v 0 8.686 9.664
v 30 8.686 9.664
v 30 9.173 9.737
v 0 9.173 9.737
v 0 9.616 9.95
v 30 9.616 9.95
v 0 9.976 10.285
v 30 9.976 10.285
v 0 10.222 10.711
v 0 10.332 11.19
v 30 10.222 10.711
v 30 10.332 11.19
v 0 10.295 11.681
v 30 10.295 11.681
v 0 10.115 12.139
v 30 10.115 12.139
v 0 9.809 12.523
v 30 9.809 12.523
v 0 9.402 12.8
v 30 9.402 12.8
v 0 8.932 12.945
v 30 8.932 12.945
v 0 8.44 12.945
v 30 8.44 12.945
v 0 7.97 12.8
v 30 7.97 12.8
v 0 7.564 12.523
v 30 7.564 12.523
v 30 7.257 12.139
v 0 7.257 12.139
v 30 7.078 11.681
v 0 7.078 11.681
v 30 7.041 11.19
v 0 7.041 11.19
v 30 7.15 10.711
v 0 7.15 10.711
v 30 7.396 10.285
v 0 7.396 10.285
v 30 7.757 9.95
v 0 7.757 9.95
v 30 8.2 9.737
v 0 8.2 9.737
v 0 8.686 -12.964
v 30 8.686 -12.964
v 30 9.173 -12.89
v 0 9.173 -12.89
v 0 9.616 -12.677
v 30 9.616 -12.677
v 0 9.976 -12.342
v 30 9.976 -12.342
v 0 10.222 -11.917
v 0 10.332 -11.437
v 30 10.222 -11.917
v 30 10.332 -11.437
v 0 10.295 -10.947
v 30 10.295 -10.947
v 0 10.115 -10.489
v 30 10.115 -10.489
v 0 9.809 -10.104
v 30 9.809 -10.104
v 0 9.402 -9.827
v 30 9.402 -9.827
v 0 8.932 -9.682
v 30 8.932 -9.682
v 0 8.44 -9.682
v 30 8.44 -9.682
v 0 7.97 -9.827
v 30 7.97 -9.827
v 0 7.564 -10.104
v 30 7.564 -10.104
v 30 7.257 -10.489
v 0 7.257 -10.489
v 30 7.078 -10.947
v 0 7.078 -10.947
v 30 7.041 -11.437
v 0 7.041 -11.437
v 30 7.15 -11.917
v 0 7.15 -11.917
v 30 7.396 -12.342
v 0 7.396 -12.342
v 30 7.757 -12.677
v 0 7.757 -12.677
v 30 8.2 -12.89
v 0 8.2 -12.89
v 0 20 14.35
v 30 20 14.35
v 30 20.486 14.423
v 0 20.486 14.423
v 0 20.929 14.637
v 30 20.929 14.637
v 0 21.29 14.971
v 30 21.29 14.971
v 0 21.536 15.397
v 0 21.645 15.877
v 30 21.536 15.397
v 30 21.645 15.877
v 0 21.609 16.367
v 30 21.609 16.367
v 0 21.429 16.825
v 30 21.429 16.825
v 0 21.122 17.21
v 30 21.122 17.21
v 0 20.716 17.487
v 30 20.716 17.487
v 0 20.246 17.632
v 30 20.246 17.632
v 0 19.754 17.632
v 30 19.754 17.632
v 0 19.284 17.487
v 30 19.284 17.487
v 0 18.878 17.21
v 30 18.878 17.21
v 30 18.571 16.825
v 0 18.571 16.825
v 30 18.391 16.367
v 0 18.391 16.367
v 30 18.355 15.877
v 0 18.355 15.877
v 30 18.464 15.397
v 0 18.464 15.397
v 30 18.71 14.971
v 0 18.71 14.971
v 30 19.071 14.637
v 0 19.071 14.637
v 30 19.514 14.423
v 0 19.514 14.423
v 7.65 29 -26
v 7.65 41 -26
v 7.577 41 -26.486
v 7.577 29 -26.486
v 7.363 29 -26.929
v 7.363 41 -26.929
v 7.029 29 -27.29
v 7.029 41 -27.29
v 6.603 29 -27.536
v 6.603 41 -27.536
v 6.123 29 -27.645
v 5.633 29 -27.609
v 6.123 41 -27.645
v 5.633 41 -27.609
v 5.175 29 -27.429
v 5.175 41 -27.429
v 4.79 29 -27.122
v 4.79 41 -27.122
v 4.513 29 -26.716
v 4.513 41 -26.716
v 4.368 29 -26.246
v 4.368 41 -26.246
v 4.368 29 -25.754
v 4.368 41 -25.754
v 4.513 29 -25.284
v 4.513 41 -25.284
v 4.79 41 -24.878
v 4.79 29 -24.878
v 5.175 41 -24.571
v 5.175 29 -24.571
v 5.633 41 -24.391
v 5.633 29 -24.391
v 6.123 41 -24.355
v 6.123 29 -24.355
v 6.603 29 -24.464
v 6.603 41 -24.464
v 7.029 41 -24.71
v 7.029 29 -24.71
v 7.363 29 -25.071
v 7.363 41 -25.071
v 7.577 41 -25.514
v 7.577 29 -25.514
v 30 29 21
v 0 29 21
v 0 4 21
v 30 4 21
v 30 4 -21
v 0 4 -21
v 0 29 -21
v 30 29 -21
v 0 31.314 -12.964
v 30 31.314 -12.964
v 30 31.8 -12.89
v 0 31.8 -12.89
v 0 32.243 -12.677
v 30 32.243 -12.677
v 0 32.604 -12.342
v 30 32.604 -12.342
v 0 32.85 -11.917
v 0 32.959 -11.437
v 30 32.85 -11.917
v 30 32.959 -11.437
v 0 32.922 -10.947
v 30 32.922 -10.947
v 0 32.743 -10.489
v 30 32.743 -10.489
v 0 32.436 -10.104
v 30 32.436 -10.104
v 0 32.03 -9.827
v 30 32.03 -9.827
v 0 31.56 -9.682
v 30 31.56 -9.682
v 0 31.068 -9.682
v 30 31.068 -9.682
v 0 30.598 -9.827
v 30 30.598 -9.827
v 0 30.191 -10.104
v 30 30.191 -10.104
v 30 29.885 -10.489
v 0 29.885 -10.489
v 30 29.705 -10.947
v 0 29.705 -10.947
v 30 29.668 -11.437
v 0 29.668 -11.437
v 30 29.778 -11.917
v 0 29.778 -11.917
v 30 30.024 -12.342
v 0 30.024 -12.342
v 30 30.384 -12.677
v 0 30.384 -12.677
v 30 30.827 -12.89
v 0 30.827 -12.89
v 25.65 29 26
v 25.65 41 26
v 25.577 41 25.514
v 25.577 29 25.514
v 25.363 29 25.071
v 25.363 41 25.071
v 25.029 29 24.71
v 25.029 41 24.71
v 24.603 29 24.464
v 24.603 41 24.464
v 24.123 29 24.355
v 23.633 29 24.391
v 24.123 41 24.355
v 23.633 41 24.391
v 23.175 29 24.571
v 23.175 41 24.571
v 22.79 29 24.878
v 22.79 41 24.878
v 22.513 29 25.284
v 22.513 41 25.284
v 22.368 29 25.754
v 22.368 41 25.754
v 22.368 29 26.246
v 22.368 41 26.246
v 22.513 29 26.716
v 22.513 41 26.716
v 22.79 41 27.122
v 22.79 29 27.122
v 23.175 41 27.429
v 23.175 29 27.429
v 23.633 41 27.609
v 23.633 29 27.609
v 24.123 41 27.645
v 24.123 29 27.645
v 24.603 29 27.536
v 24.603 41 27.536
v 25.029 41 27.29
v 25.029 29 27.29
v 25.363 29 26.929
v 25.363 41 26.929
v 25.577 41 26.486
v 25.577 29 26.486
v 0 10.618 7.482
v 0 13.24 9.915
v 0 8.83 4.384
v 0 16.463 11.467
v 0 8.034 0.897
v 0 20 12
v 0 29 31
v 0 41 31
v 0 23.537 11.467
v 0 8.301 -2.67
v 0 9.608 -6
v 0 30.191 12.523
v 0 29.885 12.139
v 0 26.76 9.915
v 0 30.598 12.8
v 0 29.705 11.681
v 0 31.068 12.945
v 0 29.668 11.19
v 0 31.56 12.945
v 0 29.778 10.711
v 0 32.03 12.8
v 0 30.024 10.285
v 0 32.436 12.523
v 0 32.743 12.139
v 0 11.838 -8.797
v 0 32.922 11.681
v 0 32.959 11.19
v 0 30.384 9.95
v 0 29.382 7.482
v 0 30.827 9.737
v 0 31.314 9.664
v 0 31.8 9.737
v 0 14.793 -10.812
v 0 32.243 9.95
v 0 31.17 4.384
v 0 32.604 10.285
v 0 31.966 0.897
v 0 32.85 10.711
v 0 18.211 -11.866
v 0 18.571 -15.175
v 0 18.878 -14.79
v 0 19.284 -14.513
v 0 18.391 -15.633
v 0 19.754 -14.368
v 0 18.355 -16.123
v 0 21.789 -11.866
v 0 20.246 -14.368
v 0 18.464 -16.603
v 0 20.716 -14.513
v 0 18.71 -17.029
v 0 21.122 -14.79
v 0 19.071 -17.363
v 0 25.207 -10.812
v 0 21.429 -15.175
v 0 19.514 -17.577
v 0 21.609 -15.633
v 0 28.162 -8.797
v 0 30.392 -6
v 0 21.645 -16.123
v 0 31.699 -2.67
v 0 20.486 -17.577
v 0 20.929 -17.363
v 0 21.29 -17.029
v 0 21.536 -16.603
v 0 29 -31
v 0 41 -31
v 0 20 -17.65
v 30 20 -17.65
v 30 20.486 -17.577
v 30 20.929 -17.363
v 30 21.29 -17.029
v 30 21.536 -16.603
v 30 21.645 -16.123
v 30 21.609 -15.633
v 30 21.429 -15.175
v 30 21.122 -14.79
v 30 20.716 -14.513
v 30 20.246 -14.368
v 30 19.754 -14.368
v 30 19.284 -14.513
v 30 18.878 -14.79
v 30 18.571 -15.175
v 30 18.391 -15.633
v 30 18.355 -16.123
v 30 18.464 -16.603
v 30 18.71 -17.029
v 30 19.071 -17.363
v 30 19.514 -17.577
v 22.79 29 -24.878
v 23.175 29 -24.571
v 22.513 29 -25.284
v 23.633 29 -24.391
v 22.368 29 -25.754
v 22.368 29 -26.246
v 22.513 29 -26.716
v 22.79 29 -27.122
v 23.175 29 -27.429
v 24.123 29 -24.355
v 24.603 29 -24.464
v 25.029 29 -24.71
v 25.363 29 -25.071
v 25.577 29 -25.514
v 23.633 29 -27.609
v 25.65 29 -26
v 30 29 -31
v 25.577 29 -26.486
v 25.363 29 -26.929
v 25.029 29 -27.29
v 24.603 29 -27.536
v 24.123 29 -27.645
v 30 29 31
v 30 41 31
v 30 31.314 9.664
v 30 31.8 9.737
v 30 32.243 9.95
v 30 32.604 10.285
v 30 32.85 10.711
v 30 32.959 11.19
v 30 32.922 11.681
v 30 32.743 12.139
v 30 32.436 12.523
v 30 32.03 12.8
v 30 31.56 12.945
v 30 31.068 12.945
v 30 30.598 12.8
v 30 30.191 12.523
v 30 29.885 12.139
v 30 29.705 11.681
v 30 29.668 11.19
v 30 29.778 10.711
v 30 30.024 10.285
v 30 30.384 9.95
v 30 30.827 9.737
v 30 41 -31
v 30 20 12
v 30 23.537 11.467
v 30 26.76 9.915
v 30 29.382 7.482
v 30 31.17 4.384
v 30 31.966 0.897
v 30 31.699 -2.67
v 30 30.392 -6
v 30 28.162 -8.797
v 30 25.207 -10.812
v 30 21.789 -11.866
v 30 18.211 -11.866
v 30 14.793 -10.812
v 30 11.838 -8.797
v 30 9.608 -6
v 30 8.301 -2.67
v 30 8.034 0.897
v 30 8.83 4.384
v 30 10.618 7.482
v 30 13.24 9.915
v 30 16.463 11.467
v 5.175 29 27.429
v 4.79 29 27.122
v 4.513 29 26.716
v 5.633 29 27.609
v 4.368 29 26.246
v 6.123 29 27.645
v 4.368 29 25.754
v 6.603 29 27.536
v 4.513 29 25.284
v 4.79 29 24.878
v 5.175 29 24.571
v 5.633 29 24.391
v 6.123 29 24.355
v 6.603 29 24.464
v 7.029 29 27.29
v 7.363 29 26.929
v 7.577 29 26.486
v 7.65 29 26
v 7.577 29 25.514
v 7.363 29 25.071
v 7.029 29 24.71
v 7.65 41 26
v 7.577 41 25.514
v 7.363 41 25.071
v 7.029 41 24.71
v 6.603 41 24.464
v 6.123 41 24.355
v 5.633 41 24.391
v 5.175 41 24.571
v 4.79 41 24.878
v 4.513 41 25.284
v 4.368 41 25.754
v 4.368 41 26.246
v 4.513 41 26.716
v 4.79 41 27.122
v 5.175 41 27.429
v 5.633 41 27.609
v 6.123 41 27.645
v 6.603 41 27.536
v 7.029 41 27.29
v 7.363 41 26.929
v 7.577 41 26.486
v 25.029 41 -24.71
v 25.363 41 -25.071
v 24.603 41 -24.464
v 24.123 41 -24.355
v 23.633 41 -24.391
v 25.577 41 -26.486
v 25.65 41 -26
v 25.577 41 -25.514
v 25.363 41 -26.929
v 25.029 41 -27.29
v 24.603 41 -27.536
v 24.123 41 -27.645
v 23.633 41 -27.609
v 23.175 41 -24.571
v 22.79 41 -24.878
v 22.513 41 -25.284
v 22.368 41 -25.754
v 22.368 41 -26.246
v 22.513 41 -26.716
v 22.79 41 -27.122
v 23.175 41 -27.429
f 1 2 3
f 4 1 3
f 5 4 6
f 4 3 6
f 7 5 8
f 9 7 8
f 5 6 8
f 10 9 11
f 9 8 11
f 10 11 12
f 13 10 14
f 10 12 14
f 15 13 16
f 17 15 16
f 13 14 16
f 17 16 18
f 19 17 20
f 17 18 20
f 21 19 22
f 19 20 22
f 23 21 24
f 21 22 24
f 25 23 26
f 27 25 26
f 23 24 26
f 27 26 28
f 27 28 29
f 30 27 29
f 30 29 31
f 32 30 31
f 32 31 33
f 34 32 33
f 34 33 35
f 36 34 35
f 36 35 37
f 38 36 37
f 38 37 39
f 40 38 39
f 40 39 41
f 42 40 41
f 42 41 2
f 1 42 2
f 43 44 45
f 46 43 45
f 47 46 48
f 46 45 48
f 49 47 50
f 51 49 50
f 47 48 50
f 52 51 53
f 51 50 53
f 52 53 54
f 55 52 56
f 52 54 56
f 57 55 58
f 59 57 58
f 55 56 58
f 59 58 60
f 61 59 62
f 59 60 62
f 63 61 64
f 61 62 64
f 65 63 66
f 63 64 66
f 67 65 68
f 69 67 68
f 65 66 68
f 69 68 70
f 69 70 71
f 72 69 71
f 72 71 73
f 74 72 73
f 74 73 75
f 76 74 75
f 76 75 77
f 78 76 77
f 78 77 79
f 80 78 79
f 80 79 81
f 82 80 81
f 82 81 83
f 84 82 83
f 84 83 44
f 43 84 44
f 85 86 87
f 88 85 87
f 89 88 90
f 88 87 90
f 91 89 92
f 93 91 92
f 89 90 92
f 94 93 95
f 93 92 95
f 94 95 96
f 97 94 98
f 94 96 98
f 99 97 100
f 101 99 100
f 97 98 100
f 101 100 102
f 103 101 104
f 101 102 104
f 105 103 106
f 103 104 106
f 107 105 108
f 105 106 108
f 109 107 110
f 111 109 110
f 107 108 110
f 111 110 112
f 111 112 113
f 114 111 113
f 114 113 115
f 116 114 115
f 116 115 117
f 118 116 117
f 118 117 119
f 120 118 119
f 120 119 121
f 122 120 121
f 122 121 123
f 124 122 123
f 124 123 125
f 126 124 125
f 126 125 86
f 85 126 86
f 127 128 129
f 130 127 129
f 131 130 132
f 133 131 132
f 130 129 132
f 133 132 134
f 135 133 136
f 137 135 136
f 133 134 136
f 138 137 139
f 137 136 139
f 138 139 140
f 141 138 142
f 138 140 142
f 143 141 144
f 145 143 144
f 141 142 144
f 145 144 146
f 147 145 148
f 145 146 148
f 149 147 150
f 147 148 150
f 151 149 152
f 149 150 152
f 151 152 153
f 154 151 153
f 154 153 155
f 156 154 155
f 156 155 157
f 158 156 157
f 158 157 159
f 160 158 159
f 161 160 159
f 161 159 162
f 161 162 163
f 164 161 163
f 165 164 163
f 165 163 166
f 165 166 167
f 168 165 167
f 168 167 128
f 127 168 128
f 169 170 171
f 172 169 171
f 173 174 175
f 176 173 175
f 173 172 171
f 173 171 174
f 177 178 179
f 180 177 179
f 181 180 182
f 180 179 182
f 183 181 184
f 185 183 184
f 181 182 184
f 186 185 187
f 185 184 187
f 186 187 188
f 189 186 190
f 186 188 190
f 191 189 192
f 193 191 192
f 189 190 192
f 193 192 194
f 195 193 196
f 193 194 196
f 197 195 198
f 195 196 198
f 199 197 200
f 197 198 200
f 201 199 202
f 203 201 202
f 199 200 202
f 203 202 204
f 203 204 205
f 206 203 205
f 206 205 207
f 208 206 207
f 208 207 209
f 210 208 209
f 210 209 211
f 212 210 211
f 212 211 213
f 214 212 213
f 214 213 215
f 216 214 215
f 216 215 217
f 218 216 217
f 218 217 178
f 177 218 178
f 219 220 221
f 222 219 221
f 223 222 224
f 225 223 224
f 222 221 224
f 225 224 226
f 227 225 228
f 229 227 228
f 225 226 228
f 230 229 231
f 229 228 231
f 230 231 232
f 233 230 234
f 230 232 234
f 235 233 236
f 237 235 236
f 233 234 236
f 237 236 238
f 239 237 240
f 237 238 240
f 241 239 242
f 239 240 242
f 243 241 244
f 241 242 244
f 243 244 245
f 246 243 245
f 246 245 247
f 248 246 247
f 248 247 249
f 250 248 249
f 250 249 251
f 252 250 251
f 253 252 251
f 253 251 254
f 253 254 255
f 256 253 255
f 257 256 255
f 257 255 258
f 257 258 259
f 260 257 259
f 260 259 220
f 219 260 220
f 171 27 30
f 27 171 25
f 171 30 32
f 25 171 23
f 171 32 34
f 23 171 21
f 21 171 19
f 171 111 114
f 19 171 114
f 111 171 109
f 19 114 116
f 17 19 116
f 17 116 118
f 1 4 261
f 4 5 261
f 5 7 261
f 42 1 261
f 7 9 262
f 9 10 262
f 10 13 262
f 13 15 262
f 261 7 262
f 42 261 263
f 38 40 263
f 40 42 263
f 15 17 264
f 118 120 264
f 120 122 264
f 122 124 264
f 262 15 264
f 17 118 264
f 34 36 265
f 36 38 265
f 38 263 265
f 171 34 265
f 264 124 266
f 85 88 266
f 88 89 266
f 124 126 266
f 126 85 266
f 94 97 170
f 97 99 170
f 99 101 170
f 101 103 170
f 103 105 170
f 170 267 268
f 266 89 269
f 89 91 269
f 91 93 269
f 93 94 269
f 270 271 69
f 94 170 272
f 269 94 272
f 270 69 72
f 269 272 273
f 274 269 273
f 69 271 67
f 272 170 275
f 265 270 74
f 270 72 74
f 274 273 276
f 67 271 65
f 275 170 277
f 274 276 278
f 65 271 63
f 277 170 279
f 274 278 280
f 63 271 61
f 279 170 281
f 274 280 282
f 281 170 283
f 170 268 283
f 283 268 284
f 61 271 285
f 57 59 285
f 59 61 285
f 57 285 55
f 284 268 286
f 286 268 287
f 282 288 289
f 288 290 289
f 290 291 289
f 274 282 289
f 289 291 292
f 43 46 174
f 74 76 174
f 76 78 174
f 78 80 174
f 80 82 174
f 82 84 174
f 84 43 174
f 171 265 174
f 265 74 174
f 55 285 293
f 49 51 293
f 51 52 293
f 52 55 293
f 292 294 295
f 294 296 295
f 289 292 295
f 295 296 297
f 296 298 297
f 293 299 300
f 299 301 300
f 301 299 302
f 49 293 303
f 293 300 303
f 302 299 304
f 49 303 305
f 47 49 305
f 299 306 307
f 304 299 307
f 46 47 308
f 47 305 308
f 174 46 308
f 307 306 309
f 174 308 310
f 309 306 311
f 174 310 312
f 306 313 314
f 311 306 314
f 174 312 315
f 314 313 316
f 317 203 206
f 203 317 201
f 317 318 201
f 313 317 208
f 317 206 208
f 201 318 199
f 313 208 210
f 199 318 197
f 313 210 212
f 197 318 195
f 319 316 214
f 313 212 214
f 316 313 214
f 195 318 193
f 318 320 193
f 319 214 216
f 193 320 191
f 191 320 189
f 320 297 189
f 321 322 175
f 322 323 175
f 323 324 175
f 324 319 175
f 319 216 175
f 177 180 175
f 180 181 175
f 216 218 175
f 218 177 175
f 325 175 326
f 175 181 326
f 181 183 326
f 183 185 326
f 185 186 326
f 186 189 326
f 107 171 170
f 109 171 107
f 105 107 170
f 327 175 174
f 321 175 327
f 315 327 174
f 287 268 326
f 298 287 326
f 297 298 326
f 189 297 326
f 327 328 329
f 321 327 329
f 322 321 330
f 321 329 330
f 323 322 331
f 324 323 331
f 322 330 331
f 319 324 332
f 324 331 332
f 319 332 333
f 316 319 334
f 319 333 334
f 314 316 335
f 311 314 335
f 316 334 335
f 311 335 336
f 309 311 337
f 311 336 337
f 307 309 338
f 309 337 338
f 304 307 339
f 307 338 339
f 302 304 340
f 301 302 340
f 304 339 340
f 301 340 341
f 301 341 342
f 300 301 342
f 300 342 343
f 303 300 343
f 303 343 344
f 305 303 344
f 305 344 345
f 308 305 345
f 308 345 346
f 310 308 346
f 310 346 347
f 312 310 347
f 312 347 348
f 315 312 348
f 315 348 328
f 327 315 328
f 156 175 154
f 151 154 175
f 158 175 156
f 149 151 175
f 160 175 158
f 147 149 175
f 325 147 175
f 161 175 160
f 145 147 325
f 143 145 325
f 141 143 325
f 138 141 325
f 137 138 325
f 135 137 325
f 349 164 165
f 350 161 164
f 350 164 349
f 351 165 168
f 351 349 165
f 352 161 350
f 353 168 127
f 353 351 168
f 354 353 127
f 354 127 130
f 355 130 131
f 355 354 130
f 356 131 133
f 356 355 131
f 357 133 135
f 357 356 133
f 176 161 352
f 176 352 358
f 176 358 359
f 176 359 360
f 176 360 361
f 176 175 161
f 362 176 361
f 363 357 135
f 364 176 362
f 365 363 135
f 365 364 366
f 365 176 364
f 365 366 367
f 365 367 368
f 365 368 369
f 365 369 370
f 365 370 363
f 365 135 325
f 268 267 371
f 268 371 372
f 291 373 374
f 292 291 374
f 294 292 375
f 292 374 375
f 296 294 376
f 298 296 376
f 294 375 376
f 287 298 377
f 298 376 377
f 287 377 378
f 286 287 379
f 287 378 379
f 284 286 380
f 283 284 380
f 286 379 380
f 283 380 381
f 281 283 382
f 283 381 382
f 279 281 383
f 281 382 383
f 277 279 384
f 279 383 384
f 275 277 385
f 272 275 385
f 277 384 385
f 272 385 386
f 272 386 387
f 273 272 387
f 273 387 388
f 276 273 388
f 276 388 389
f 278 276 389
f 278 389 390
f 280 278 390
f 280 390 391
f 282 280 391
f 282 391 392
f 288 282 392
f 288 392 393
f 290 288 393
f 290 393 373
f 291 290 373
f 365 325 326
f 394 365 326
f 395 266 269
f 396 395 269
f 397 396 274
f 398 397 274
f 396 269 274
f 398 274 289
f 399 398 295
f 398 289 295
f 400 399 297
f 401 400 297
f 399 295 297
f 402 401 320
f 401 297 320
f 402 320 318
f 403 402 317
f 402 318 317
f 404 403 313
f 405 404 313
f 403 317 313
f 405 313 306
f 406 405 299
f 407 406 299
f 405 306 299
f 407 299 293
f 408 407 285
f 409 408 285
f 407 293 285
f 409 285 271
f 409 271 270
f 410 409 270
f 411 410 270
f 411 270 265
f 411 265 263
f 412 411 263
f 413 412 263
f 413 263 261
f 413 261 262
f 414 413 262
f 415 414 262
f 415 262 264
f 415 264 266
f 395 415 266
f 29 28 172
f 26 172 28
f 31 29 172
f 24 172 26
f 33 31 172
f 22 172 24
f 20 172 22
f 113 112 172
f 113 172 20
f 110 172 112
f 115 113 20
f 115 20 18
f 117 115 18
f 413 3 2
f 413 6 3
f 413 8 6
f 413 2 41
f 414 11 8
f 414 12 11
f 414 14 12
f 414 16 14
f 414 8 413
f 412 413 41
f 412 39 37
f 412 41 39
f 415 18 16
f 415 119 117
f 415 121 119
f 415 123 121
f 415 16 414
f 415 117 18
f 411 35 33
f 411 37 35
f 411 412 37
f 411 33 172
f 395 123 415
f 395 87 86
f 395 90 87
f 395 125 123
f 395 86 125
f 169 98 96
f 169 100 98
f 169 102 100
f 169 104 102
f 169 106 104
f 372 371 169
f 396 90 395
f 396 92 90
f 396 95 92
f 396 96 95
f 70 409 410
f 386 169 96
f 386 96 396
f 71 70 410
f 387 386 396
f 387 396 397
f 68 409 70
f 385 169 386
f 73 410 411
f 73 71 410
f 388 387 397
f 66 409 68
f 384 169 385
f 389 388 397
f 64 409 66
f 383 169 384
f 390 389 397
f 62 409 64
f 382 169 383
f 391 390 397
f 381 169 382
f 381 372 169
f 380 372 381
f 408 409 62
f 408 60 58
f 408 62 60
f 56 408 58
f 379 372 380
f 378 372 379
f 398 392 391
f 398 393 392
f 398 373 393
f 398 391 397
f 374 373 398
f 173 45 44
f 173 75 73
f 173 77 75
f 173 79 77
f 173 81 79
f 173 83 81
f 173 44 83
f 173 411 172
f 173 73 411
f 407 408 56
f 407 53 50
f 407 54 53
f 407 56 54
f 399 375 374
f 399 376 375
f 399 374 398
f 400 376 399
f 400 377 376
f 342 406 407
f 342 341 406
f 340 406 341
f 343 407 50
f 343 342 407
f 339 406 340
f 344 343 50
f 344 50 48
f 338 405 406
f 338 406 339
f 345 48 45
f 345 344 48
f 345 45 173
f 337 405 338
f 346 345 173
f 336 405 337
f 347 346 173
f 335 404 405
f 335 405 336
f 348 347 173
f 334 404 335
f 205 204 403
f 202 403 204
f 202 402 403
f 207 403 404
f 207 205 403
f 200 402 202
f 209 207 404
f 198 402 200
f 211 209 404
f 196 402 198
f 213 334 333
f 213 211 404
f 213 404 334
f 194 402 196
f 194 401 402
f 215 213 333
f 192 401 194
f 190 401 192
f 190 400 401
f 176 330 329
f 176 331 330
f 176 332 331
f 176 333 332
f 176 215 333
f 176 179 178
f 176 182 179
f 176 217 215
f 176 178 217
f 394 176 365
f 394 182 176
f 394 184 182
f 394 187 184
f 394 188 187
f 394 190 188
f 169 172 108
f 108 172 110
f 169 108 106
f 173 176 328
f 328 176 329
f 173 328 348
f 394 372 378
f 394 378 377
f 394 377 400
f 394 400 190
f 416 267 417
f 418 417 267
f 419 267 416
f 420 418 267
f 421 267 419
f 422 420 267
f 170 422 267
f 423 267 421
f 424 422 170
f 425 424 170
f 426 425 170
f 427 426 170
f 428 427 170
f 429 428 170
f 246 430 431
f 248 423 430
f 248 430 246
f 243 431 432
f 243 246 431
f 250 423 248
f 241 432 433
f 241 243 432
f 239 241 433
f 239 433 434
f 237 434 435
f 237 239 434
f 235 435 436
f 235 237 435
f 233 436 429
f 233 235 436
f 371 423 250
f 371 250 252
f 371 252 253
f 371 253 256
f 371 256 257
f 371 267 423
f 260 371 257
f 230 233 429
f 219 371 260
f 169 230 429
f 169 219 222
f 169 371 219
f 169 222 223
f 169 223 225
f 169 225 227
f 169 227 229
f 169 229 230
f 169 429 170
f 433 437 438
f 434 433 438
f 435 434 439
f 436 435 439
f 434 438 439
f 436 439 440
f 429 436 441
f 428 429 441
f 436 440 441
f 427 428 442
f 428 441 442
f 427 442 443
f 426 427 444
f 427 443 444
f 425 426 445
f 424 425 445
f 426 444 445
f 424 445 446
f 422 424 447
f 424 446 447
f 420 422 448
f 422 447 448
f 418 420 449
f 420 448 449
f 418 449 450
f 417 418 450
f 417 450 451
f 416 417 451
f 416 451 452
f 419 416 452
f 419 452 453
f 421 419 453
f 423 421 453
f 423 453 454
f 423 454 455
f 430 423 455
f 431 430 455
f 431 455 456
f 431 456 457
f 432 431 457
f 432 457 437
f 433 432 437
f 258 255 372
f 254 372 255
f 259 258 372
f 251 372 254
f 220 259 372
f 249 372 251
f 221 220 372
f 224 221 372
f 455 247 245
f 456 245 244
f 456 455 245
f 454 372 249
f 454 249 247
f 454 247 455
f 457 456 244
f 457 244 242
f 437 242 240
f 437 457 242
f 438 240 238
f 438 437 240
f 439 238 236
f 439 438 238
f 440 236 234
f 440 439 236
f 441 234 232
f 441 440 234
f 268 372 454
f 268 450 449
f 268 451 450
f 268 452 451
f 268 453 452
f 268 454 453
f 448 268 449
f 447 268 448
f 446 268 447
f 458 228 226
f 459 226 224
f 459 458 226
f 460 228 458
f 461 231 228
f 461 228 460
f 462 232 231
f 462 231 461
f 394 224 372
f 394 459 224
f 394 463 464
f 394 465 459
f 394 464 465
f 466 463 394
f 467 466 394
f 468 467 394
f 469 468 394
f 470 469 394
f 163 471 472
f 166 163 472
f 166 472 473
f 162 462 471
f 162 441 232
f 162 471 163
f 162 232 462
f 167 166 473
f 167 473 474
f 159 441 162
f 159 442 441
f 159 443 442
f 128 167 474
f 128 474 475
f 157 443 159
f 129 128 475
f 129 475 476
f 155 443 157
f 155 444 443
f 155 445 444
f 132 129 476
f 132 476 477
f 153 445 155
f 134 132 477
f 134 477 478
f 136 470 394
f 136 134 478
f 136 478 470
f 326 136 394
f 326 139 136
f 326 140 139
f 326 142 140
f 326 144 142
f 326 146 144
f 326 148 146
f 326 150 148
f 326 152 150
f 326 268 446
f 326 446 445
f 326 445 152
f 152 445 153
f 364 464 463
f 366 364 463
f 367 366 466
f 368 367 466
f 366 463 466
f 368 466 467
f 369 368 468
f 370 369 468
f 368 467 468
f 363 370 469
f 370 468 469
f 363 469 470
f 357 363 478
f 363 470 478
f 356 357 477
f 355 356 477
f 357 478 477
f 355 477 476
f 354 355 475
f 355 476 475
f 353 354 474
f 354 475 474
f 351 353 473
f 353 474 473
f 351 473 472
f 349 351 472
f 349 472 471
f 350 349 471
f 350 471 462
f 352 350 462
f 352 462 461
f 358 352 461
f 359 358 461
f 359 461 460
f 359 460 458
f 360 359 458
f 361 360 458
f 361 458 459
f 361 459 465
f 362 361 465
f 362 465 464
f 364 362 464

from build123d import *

# Parameters (mm, degrees)
SKETCH_2_W          = 62
SKETCH_2_H          = 82
EXTRUDE_2_DEPTH     = 30
SKETCH_3_R          = 12
CUT_EXTRUDE_1_DEPTH = 60.514704065
CUT_EXTRUDE_2_DEPTH = 60.514704065
HOLE_WIZARD_M4_1_D  = 3.3
HOLE_WIZARD_M4_2_D  = 3.3


with BuildPart() as part:
    # 草图2 → 凸台-拉伸2 (new body)
    with BuildSketch(Plane(origin=(0, 0, 0), x_dir=(0, 0, -1), z_dir=(1, 0, 0))):
        Rectangle(SKETCH_2_W, SKETCH_2_H)
    extrude(amount=EXTRUDE_2_DEPTH)

    # 草图3 → 切除-拉伸1 (cut, through all)
    with BuildSketch(Plane.ZY):
        with Locations((0, 20)):
            Circle(SKETCH_3_R)
    extrude(amount=-CUT_EXTRUDE_1_DEPTH, mode=Mode.SUBTRACT)

    # 草图7 → 切除-拉伸2 (cut, through all)
    with BuildSketch(Plane(origin=(30, 0, 0), x_dir=(0, 0, -1), z_dir=(1, 0, 0))):
        Polygon((-31, 29), (-21, 29), (-21, 4), (21, 4), (21, 29), (31, 29), (31, -41), (-31, -41), align=None)
    extrude(amount=-CUT_EXTRUDE_2_DEPTH, mode=Mode.SUBTRACT)

    # M4 螺纹孔1 (through all)
    with Locations(Plane.ZY):
        with Locations((-11.313708499, 31.313708499), (11.313708499, 8.686291501), (11.313708499, 31.313708499), (16, 20), (-11.313708499, 8.686291501), (-16, 20)):
            Hole(HOLE_WIZARD_M4_1_D / 2)

    # M4 螺纹孔2 (through all)
    with Locations(Plane(origin=(0, 29, 0), x_dir=(-1, 0, 0), z_dir=(0, -1, 0))):
        with Locations((-6, 26), (-24, 26), (-6, -26), (-24, -26)):
            Hole(HOLE_WIZARD_M4_2_D / 2)


solid = part.part
